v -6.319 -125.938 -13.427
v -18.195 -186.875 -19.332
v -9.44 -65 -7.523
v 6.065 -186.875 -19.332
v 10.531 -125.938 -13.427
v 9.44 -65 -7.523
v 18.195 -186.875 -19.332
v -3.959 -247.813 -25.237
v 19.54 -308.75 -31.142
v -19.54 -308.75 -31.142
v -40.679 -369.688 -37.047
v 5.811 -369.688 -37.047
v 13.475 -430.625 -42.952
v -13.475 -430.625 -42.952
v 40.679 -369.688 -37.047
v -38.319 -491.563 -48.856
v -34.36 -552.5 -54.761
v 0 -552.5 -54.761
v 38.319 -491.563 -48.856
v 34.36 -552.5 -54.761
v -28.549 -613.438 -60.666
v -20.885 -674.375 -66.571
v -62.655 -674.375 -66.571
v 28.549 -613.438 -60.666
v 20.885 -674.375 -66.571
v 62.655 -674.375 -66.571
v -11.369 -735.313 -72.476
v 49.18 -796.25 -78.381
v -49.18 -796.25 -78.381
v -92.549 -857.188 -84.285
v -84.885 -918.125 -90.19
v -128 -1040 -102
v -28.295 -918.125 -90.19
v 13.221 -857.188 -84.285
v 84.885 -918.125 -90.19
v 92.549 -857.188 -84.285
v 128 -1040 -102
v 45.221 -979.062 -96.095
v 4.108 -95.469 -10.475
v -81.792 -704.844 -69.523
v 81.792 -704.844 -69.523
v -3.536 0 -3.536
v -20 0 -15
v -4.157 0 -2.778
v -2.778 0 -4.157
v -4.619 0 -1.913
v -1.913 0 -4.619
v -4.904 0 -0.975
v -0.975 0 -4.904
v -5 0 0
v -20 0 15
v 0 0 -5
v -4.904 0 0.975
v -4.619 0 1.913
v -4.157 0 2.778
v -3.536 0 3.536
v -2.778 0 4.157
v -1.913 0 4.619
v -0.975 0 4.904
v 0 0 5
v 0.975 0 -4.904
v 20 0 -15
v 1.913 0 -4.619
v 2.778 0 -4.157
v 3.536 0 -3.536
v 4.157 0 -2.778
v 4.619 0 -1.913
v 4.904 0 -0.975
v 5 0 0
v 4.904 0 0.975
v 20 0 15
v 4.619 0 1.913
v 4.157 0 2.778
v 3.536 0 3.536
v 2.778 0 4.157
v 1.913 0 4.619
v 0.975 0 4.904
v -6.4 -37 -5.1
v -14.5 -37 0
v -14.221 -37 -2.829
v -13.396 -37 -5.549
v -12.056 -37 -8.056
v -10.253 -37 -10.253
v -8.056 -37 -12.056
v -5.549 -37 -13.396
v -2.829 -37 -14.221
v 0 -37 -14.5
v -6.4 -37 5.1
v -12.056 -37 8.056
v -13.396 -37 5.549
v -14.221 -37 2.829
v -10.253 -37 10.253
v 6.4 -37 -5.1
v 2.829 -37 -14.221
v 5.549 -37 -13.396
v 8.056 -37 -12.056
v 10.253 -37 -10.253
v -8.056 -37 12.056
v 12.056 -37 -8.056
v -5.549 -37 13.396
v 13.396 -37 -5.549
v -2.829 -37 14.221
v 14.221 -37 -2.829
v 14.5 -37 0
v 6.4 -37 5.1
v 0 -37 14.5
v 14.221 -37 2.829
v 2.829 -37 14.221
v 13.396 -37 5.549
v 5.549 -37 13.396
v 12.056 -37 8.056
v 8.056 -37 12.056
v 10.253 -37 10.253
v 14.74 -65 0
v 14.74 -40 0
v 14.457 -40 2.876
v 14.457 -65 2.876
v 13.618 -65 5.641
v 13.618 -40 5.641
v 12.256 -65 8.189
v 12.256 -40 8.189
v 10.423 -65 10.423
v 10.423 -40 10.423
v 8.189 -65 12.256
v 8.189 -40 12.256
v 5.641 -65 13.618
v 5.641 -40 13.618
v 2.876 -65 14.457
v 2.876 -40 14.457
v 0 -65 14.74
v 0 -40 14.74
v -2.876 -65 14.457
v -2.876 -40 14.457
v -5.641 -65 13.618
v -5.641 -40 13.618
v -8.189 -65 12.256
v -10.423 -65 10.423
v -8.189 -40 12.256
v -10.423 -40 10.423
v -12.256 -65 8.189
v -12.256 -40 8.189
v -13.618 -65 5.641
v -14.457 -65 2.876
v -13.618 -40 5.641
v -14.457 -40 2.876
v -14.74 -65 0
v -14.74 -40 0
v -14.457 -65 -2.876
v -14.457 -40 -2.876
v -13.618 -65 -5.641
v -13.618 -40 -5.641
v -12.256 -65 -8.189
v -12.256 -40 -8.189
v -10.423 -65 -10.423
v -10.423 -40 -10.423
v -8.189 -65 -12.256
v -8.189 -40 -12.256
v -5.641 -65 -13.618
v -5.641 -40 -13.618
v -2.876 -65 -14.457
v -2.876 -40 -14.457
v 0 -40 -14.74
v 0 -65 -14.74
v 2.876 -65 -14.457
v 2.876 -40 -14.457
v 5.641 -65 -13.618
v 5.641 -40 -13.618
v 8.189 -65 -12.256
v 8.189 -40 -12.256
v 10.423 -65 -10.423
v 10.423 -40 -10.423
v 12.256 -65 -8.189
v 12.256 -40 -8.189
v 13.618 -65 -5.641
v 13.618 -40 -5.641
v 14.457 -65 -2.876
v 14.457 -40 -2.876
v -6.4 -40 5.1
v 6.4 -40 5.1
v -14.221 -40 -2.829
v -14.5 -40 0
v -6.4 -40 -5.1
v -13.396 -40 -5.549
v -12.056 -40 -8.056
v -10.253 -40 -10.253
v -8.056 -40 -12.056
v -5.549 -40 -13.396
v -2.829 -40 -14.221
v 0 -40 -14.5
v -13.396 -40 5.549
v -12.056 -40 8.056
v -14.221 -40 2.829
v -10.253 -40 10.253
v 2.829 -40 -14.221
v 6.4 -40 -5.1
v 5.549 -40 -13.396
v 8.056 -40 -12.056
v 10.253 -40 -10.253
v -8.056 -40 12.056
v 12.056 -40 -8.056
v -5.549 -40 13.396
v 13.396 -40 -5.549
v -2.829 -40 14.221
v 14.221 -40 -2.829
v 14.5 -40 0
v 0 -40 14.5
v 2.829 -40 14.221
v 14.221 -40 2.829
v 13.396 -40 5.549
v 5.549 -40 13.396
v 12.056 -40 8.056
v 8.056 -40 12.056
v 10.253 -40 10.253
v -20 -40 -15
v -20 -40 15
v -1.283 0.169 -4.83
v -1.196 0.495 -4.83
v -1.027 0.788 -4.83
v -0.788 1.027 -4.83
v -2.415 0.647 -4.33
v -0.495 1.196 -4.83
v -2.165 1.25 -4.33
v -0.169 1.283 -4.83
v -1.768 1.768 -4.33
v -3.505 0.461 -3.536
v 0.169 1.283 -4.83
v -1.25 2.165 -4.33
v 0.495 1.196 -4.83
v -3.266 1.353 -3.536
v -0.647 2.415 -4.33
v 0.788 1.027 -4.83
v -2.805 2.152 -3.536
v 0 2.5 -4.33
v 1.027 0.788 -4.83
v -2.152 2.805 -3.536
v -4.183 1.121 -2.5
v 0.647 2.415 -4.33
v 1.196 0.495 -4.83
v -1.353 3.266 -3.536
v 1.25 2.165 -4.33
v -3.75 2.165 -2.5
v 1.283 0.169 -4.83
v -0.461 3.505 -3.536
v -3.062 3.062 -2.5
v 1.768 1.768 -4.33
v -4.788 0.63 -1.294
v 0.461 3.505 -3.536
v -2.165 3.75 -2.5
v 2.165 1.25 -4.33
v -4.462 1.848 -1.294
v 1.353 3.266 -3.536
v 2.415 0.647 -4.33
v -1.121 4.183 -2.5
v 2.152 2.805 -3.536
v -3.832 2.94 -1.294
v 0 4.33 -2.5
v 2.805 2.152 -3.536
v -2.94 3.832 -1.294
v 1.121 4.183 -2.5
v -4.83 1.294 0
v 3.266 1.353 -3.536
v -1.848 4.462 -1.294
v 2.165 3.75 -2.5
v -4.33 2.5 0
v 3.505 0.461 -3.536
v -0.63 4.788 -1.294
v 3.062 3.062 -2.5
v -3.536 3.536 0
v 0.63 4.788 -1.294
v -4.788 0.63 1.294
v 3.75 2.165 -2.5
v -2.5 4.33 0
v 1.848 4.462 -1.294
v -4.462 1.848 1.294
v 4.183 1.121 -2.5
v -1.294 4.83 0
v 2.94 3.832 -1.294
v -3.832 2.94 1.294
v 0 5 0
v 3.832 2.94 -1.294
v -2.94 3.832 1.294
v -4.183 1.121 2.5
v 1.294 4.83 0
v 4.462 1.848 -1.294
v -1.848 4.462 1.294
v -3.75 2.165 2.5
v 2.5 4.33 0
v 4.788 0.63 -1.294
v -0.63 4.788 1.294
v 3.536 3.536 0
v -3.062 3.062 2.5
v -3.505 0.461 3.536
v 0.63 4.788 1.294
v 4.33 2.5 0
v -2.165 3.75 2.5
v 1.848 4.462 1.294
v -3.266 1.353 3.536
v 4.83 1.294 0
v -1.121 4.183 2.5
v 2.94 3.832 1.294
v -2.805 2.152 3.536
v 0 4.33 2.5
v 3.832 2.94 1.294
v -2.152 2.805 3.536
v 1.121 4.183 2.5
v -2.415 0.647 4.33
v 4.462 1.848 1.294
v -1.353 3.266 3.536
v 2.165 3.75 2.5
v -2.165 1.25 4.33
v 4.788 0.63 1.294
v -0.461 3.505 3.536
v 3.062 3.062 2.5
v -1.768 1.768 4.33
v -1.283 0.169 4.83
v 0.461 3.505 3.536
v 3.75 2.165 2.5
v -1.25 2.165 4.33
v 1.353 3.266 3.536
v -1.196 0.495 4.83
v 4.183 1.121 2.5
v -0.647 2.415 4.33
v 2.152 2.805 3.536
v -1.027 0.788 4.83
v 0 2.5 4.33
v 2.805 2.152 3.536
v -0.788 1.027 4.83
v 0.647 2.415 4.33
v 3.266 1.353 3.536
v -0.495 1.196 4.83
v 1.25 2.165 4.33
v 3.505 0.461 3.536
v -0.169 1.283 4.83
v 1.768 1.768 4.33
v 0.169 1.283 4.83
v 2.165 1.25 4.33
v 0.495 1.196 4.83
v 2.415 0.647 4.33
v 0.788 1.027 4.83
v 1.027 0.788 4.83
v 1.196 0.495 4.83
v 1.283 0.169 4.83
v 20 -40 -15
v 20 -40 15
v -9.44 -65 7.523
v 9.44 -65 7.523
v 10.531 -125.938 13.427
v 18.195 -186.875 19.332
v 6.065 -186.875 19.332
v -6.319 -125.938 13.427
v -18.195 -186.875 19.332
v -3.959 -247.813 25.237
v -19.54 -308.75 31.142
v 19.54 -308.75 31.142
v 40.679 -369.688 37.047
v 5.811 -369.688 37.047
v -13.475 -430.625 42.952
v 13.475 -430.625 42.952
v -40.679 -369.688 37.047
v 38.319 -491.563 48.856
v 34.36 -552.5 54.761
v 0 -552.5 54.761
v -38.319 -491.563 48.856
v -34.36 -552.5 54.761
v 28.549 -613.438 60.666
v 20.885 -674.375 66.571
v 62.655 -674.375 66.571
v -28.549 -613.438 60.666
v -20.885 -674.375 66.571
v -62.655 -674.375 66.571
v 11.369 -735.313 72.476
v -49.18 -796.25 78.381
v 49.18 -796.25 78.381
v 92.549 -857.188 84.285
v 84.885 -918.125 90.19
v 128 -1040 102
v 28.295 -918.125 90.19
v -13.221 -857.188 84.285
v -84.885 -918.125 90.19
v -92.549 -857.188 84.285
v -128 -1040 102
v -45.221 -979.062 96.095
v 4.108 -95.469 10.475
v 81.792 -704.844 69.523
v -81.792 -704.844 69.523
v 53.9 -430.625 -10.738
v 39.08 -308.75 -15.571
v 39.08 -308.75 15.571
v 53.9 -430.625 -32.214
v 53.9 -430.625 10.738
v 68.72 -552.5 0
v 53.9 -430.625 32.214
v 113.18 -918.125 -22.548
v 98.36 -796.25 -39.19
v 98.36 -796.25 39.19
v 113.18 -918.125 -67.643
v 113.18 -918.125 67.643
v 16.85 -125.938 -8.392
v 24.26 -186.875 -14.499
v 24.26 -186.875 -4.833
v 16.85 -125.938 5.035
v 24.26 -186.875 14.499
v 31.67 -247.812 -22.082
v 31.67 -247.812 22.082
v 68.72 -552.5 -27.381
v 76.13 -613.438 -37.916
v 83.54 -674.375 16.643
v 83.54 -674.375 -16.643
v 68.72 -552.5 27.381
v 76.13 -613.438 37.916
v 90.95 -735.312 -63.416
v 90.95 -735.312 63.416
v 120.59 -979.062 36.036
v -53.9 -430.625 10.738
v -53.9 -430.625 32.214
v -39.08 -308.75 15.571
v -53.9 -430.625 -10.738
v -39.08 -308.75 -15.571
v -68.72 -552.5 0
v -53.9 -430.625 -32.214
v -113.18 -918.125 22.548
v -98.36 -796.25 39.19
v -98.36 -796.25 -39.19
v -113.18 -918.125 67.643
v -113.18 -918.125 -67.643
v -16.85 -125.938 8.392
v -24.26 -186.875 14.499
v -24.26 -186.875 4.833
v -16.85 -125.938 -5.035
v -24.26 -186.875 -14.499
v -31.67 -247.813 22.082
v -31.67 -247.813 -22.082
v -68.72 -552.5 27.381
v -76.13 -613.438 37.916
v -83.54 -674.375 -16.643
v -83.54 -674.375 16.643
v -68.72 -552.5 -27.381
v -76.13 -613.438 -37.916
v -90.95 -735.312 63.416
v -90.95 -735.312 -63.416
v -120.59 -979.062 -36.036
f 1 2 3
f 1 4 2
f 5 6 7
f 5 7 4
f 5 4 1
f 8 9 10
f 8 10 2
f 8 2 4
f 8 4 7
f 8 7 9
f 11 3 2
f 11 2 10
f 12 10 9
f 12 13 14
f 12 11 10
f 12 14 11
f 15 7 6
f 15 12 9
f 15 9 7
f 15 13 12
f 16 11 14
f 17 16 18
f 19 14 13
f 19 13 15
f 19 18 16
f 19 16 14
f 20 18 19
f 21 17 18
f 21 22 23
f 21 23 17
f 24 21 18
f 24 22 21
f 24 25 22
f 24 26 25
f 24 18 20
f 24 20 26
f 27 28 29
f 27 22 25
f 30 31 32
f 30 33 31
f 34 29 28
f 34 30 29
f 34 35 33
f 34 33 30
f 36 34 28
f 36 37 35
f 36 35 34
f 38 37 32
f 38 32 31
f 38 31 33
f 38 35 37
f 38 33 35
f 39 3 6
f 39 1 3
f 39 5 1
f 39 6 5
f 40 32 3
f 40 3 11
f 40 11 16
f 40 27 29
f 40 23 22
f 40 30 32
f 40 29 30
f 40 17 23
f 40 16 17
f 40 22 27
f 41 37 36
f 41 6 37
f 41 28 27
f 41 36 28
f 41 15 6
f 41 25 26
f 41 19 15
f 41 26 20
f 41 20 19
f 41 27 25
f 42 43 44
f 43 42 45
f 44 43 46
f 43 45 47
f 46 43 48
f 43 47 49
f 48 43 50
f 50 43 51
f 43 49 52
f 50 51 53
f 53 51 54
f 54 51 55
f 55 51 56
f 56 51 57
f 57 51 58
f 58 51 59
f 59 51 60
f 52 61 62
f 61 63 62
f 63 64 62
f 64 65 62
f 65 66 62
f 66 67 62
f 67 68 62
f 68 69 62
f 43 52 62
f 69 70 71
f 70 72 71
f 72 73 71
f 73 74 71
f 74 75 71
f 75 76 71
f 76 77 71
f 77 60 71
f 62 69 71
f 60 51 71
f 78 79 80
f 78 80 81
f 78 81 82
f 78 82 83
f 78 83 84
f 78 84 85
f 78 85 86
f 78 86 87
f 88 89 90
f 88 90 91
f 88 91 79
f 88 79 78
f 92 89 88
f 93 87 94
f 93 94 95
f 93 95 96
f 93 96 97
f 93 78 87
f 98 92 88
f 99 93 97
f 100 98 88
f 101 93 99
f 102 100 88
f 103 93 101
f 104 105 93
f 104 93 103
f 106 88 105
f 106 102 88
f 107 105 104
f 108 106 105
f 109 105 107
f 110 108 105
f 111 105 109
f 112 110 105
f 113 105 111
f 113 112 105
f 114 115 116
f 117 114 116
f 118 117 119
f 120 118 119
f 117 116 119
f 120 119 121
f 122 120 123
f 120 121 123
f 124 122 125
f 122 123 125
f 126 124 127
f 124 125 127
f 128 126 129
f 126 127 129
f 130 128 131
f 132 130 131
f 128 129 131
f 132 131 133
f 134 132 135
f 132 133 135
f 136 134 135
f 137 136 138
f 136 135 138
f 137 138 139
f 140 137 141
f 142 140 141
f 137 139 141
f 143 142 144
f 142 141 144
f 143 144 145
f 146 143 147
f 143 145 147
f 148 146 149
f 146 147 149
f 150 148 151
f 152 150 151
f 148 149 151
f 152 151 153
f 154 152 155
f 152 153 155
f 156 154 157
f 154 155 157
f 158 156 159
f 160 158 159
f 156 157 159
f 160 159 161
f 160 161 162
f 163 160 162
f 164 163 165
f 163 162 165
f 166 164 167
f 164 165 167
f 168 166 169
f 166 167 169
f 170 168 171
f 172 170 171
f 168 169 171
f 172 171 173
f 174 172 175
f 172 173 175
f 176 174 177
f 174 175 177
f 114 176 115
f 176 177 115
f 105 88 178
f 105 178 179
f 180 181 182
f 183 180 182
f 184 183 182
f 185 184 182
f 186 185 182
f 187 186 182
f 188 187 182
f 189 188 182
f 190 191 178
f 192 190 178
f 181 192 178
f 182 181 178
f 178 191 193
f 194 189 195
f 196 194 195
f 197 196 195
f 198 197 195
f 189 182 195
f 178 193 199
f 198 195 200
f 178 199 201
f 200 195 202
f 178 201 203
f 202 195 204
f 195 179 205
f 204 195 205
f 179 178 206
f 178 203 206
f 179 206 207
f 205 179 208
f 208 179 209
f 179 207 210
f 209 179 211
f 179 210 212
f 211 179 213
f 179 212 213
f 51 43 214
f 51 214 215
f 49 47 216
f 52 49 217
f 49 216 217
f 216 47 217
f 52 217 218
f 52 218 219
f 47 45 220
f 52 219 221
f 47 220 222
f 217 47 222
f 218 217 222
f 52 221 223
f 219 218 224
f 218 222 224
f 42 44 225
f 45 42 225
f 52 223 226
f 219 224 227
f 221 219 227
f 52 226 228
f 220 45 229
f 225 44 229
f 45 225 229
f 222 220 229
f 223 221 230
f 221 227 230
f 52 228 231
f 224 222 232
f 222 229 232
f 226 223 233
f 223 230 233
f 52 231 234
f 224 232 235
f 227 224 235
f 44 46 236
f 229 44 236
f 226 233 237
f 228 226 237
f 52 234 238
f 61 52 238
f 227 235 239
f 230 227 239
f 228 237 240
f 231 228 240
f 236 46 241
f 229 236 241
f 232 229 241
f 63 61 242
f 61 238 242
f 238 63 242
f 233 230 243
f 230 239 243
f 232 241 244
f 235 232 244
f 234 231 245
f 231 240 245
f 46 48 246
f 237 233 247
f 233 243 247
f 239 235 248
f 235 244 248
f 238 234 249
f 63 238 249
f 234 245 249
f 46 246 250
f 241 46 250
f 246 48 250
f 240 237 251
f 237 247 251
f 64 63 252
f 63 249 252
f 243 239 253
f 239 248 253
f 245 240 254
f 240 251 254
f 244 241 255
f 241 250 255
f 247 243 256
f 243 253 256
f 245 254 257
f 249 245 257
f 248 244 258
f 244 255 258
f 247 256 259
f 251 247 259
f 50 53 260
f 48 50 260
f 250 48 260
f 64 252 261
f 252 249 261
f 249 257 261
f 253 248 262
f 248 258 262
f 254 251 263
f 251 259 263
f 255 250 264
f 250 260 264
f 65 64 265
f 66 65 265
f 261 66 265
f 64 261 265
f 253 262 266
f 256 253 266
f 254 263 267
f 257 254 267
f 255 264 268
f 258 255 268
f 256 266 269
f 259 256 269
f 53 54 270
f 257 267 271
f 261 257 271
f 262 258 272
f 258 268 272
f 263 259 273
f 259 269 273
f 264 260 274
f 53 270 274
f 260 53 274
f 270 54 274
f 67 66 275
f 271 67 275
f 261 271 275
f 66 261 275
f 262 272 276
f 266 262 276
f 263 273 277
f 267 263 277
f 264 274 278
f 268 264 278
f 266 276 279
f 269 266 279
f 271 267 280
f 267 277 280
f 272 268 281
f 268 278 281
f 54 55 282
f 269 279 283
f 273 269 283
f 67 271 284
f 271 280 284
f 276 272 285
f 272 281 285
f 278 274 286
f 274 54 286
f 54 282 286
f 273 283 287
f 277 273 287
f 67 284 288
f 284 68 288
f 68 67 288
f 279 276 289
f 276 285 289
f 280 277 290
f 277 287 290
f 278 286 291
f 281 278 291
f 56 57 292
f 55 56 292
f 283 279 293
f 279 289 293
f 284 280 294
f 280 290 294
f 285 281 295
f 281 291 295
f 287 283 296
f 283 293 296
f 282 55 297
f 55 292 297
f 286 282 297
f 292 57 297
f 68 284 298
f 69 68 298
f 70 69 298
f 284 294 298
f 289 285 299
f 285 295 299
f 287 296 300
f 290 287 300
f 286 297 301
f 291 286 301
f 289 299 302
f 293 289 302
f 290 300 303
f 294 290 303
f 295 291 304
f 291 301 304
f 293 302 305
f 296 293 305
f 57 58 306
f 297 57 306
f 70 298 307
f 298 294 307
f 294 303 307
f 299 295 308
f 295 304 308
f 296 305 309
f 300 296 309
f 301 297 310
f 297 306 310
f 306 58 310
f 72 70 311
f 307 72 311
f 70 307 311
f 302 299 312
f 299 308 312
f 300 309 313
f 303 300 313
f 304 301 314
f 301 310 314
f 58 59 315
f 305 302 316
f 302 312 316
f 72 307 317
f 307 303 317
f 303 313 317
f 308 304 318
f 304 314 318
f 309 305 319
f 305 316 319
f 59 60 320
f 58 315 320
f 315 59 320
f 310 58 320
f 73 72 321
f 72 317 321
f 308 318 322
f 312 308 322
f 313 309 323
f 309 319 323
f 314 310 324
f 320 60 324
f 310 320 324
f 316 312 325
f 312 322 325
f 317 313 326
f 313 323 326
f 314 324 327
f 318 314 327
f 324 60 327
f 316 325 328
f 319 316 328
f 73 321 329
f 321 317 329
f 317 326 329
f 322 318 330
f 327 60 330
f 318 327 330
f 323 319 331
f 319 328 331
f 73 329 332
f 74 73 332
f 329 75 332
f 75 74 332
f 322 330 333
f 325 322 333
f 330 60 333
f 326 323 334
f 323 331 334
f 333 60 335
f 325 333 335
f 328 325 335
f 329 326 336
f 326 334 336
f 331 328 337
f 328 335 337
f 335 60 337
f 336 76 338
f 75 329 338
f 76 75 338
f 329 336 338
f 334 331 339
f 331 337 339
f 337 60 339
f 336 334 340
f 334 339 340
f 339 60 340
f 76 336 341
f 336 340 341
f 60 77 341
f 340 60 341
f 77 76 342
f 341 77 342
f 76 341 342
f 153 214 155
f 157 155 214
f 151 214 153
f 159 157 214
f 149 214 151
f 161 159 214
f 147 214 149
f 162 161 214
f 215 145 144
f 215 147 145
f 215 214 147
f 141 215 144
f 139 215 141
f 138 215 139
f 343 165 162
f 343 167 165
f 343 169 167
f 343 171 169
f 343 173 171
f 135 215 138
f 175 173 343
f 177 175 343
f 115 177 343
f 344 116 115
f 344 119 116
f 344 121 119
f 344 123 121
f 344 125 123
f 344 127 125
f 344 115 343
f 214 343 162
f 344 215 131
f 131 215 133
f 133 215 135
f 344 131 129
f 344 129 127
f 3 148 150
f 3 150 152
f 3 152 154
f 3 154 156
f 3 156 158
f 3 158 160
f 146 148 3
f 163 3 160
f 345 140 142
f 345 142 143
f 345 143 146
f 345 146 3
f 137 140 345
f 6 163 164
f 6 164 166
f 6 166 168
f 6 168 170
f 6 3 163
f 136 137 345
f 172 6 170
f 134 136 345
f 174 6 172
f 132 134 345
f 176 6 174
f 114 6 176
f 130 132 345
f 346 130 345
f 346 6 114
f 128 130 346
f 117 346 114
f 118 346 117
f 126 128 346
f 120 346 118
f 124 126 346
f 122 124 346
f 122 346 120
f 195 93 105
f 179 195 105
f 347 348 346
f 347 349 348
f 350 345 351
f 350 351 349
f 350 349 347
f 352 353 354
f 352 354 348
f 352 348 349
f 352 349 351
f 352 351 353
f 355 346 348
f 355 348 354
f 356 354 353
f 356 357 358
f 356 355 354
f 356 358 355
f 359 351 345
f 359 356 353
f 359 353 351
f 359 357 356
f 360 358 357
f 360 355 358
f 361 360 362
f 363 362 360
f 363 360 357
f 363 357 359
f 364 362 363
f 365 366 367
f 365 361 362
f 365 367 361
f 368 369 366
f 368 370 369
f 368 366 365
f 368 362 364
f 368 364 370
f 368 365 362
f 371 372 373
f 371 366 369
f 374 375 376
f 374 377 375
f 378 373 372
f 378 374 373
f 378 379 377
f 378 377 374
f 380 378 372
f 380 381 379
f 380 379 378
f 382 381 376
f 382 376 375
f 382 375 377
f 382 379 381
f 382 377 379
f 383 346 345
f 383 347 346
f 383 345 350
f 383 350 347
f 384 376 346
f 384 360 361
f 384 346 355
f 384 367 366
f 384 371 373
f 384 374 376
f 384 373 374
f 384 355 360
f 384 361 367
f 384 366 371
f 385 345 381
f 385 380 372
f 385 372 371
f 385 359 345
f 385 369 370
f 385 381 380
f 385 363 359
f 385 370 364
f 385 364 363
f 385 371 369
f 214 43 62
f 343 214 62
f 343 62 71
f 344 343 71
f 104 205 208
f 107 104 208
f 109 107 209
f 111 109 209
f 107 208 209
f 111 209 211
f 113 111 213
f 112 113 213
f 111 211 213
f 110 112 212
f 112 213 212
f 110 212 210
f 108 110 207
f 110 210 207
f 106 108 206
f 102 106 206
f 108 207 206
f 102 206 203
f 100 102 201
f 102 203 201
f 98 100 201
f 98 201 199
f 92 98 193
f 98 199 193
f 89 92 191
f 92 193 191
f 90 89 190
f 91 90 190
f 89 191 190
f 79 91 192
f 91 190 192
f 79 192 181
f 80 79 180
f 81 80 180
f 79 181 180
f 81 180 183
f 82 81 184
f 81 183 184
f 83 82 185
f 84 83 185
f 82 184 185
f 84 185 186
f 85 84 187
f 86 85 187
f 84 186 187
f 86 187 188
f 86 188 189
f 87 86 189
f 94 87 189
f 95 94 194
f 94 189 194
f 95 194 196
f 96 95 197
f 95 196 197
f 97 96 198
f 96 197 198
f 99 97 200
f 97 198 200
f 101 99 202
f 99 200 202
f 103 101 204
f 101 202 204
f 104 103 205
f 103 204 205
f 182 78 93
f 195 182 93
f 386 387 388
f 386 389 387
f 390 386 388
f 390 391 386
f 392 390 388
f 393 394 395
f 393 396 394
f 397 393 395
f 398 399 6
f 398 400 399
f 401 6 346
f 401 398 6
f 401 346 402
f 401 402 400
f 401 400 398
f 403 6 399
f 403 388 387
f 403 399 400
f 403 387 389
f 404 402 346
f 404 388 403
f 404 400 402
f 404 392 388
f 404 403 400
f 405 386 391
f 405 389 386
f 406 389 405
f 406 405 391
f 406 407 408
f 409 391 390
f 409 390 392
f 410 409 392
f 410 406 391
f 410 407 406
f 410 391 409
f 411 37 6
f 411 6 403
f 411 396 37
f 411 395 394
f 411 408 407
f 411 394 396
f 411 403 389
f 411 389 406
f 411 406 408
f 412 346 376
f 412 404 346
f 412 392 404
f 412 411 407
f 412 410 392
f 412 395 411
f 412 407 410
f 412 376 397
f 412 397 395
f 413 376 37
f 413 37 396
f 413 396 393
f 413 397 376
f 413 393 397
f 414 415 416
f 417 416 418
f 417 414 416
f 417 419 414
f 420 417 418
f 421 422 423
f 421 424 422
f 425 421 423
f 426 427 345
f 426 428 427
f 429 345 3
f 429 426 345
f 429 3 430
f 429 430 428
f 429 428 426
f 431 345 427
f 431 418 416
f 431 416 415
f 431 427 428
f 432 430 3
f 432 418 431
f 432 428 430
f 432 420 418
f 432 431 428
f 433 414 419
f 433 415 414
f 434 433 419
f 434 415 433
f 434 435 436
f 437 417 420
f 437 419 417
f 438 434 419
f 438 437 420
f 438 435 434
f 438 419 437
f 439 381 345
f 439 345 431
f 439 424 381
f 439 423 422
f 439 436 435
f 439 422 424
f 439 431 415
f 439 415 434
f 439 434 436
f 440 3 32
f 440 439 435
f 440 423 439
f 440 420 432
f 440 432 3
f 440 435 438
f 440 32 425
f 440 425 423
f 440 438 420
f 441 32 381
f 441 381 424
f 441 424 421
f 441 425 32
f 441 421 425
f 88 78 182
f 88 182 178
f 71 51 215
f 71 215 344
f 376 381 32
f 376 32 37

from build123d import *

# Parameters (mm, degrees)
F0_W      = 40
F0_H      = 30
F1_DEPTH  = 40
F3_R      = 14.5
F4_DEPTH  = 3
F5_W      = 12.8
F5_H      = 10.2
F6_DEPTH  = 3
F6_FACE_W = 12.8
F6_FACE_H = 10.2
F8_W      = 256
F8_H      = 204
F12_R     = 14.7401358377
F13_DEPTH = 25


with BuildPart() as f1:
    # F0 (on Front) → F1 (new body)
    with BuildSketch(Plane.XZ):
        Rectangle(F0_W, F0_H)
    extrude(amount=F1_DEPTH)

    # F3 (on face) → F4 (cut)
    with BuildSketch(Plane.XZ.offset(40)):
        Circle(F3_R)
    extrude(amount=-F4_DEPTH, mode=Mode.SUBTRACT)

    # F5 (on face) → F6 (join)
    with BuildSketch(Plane.XZ.offset(37)):
        Rectangle(F5_W, F5_H)
    extrude(amount=F6_DEPTH)

    # F6_face (on face) → F9 section 0
    with BuildSketch(Plane.XZ.offset(40)):
        Rectangle(F6_FACE_W, F6_FACE_H)
    # F8 (on offset) → F9 section 1
    with BuildSketch(Plane.XZ.offset(1040)):
        Rectangle(F8_W, F8_H)
    loft()

    # F10 (on face) → F11 (revolve)
    with BuildSketch(Plane.XZ):
        with BuildLine():
            ThreePointArc((0, -5), (5, 0), (0, 5))
            Line((0, 5), (0, -5))
        make_face()
    revolve(axis=Axis((0, 0, 0), (0, 0, -1)))

    # F12 (on face) → F13 (join)
    with BuildSketch(Plane.XZ.offset(40)):
        Circle(F12_R)
    extrude(amount=F13_DEPTH)


solid = f1.part
